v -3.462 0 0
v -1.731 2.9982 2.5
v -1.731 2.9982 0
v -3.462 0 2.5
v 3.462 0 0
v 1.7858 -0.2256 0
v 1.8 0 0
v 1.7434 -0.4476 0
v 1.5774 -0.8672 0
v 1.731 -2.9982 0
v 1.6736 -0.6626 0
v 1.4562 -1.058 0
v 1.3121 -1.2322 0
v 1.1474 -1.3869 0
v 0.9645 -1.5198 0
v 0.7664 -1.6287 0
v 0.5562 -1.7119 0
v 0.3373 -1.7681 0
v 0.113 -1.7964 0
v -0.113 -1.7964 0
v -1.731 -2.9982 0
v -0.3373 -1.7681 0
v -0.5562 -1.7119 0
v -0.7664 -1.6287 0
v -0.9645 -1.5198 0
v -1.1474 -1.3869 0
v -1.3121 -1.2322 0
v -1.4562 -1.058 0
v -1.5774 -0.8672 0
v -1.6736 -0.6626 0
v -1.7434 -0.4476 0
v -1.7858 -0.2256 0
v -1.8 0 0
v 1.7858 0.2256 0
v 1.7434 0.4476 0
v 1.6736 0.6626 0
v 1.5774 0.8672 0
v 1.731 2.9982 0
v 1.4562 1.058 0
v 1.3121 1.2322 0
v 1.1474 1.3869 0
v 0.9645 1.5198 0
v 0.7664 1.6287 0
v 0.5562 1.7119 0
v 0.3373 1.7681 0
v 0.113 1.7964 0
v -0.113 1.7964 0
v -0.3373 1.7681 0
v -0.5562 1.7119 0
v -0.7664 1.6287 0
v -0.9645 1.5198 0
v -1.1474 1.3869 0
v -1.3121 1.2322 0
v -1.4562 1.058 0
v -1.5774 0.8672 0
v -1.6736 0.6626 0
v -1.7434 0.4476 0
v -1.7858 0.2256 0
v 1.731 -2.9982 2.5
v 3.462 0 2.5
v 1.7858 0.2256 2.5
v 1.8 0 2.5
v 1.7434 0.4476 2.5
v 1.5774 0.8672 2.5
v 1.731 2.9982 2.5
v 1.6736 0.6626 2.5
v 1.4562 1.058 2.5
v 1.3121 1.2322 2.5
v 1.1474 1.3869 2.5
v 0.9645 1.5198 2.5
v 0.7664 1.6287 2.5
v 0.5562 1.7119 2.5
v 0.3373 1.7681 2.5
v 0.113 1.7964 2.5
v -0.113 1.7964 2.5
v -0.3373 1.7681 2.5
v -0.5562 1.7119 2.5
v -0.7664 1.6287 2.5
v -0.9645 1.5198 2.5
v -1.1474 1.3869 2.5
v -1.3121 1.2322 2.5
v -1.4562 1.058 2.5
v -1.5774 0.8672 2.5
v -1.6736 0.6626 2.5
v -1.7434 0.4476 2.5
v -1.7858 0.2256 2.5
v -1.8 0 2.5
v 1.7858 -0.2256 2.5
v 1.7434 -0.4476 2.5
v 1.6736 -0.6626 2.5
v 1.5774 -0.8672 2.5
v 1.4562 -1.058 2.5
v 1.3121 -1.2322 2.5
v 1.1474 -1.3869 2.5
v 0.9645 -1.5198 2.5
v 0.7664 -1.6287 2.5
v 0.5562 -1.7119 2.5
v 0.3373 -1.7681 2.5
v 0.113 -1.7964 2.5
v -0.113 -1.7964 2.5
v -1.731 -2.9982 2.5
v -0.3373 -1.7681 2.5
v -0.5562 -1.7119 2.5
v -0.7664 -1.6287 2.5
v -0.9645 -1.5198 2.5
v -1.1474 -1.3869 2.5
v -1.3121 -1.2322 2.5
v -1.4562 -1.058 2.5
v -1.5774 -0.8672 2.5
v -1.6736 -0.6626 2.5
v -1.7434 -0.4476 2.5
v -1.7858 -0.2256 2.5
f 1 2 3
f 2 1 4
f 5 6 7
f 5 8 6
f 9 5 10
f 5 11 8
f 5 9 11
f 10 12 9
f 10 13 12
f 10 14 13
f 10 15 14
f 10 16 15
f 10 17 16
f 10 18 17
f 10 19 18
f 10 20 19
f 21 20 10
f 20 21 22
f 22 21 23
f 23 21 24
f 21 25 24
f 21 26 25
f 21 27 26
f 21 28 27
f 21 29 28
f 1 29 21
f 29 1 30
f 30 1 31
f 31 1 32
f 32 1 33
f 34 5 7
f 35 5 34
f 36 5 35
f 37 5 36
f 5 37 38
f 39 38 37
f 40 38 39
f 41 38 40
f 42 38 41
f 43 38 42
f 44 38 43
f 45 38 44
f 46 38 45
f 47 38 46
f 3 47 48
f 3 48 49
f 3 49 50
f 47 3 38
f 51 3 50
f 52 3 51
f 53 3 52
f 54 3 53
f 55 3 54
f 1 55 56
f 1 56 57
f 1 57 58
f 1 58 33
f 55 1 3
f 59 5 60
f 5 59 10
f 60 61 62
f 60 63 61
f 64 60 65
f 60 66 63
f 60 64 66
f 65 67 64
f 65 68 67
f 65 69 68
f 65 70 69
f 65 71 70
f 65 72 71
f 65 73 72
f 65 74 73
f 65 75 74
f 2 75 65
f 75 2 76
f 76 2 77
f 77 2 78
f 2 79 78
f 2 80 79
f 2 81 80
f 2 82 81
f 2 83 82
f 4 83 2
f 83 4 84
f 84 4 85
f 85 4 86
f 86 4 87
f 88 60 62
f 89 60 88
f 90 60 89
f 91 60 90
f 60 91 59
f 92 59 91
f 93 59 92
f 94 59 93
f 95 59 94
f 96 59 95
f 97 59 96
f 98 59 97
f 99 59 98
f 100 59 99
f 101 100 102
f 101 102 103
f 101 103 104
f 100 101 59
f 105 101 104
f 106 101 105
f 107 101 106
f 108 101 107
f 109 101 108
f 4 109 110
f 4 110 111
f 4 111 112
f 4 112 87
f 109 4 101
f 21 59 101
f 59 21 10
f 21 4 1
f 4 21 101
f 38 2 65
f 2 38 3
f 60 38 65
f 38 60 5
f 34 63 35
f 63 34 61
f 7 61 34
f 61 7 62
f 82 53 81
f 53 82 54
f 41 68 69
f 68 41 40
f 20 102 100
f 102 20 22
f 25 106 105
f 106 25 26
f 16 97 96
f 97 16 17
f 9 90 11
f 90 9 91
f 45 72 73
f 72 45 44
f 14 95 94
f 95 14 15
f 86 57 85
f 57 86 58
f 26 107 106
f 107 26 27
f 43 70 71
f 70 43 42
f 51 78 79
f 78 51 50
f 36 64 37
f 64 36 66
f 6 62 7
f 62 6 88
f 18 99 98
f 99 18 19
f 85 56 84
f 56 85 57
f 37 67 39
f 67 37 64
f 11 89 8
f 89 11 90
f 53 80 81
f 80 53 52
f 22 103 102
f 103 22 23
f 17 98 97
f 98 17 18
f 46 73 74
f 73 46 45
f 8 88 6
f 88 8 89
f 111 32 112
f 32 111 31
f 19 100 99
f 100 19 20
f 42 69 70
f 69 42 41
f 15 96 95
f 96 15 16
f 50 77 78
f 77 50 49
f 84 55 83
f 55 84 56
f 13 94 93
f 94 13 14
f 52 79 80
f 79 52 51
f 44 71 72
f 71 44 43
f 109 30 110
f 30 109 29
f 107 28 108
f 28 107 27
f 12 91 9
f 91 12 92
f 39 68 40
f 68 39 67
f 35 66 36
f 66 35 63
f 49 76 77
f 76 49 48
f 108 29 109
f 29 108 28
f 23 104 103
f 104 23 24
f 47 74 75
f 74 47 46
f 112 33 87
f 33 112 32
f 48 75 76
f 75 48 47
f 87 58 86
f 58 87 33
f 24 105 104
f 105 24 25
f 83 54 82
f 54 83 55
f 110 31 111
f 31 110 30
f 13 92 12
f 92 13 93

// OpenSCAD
$fn = 50;


difference() {
	union() {
		translate(v = [0, 0, 0]) {
			rotate(a = [0, 0, 0]) {
				difference() {
					union() {
						linear_extrude(height = 2.5000000000) {
							polygon(points = [[3.4620000000, 0.0000000000], [1.7310000000, 2.9981799479], [-1.7310000000, 2.9981799479], [-3.4620000000, 0.0000000000], [-1.7310000000, -2.9981799479], [1.7310000000, -2.9981799479]]);
						}
					}
					union();
				}
			}
		}
	}
	union() {
		cylinder(h = 100, r = 1.8000000000);
	}
}
